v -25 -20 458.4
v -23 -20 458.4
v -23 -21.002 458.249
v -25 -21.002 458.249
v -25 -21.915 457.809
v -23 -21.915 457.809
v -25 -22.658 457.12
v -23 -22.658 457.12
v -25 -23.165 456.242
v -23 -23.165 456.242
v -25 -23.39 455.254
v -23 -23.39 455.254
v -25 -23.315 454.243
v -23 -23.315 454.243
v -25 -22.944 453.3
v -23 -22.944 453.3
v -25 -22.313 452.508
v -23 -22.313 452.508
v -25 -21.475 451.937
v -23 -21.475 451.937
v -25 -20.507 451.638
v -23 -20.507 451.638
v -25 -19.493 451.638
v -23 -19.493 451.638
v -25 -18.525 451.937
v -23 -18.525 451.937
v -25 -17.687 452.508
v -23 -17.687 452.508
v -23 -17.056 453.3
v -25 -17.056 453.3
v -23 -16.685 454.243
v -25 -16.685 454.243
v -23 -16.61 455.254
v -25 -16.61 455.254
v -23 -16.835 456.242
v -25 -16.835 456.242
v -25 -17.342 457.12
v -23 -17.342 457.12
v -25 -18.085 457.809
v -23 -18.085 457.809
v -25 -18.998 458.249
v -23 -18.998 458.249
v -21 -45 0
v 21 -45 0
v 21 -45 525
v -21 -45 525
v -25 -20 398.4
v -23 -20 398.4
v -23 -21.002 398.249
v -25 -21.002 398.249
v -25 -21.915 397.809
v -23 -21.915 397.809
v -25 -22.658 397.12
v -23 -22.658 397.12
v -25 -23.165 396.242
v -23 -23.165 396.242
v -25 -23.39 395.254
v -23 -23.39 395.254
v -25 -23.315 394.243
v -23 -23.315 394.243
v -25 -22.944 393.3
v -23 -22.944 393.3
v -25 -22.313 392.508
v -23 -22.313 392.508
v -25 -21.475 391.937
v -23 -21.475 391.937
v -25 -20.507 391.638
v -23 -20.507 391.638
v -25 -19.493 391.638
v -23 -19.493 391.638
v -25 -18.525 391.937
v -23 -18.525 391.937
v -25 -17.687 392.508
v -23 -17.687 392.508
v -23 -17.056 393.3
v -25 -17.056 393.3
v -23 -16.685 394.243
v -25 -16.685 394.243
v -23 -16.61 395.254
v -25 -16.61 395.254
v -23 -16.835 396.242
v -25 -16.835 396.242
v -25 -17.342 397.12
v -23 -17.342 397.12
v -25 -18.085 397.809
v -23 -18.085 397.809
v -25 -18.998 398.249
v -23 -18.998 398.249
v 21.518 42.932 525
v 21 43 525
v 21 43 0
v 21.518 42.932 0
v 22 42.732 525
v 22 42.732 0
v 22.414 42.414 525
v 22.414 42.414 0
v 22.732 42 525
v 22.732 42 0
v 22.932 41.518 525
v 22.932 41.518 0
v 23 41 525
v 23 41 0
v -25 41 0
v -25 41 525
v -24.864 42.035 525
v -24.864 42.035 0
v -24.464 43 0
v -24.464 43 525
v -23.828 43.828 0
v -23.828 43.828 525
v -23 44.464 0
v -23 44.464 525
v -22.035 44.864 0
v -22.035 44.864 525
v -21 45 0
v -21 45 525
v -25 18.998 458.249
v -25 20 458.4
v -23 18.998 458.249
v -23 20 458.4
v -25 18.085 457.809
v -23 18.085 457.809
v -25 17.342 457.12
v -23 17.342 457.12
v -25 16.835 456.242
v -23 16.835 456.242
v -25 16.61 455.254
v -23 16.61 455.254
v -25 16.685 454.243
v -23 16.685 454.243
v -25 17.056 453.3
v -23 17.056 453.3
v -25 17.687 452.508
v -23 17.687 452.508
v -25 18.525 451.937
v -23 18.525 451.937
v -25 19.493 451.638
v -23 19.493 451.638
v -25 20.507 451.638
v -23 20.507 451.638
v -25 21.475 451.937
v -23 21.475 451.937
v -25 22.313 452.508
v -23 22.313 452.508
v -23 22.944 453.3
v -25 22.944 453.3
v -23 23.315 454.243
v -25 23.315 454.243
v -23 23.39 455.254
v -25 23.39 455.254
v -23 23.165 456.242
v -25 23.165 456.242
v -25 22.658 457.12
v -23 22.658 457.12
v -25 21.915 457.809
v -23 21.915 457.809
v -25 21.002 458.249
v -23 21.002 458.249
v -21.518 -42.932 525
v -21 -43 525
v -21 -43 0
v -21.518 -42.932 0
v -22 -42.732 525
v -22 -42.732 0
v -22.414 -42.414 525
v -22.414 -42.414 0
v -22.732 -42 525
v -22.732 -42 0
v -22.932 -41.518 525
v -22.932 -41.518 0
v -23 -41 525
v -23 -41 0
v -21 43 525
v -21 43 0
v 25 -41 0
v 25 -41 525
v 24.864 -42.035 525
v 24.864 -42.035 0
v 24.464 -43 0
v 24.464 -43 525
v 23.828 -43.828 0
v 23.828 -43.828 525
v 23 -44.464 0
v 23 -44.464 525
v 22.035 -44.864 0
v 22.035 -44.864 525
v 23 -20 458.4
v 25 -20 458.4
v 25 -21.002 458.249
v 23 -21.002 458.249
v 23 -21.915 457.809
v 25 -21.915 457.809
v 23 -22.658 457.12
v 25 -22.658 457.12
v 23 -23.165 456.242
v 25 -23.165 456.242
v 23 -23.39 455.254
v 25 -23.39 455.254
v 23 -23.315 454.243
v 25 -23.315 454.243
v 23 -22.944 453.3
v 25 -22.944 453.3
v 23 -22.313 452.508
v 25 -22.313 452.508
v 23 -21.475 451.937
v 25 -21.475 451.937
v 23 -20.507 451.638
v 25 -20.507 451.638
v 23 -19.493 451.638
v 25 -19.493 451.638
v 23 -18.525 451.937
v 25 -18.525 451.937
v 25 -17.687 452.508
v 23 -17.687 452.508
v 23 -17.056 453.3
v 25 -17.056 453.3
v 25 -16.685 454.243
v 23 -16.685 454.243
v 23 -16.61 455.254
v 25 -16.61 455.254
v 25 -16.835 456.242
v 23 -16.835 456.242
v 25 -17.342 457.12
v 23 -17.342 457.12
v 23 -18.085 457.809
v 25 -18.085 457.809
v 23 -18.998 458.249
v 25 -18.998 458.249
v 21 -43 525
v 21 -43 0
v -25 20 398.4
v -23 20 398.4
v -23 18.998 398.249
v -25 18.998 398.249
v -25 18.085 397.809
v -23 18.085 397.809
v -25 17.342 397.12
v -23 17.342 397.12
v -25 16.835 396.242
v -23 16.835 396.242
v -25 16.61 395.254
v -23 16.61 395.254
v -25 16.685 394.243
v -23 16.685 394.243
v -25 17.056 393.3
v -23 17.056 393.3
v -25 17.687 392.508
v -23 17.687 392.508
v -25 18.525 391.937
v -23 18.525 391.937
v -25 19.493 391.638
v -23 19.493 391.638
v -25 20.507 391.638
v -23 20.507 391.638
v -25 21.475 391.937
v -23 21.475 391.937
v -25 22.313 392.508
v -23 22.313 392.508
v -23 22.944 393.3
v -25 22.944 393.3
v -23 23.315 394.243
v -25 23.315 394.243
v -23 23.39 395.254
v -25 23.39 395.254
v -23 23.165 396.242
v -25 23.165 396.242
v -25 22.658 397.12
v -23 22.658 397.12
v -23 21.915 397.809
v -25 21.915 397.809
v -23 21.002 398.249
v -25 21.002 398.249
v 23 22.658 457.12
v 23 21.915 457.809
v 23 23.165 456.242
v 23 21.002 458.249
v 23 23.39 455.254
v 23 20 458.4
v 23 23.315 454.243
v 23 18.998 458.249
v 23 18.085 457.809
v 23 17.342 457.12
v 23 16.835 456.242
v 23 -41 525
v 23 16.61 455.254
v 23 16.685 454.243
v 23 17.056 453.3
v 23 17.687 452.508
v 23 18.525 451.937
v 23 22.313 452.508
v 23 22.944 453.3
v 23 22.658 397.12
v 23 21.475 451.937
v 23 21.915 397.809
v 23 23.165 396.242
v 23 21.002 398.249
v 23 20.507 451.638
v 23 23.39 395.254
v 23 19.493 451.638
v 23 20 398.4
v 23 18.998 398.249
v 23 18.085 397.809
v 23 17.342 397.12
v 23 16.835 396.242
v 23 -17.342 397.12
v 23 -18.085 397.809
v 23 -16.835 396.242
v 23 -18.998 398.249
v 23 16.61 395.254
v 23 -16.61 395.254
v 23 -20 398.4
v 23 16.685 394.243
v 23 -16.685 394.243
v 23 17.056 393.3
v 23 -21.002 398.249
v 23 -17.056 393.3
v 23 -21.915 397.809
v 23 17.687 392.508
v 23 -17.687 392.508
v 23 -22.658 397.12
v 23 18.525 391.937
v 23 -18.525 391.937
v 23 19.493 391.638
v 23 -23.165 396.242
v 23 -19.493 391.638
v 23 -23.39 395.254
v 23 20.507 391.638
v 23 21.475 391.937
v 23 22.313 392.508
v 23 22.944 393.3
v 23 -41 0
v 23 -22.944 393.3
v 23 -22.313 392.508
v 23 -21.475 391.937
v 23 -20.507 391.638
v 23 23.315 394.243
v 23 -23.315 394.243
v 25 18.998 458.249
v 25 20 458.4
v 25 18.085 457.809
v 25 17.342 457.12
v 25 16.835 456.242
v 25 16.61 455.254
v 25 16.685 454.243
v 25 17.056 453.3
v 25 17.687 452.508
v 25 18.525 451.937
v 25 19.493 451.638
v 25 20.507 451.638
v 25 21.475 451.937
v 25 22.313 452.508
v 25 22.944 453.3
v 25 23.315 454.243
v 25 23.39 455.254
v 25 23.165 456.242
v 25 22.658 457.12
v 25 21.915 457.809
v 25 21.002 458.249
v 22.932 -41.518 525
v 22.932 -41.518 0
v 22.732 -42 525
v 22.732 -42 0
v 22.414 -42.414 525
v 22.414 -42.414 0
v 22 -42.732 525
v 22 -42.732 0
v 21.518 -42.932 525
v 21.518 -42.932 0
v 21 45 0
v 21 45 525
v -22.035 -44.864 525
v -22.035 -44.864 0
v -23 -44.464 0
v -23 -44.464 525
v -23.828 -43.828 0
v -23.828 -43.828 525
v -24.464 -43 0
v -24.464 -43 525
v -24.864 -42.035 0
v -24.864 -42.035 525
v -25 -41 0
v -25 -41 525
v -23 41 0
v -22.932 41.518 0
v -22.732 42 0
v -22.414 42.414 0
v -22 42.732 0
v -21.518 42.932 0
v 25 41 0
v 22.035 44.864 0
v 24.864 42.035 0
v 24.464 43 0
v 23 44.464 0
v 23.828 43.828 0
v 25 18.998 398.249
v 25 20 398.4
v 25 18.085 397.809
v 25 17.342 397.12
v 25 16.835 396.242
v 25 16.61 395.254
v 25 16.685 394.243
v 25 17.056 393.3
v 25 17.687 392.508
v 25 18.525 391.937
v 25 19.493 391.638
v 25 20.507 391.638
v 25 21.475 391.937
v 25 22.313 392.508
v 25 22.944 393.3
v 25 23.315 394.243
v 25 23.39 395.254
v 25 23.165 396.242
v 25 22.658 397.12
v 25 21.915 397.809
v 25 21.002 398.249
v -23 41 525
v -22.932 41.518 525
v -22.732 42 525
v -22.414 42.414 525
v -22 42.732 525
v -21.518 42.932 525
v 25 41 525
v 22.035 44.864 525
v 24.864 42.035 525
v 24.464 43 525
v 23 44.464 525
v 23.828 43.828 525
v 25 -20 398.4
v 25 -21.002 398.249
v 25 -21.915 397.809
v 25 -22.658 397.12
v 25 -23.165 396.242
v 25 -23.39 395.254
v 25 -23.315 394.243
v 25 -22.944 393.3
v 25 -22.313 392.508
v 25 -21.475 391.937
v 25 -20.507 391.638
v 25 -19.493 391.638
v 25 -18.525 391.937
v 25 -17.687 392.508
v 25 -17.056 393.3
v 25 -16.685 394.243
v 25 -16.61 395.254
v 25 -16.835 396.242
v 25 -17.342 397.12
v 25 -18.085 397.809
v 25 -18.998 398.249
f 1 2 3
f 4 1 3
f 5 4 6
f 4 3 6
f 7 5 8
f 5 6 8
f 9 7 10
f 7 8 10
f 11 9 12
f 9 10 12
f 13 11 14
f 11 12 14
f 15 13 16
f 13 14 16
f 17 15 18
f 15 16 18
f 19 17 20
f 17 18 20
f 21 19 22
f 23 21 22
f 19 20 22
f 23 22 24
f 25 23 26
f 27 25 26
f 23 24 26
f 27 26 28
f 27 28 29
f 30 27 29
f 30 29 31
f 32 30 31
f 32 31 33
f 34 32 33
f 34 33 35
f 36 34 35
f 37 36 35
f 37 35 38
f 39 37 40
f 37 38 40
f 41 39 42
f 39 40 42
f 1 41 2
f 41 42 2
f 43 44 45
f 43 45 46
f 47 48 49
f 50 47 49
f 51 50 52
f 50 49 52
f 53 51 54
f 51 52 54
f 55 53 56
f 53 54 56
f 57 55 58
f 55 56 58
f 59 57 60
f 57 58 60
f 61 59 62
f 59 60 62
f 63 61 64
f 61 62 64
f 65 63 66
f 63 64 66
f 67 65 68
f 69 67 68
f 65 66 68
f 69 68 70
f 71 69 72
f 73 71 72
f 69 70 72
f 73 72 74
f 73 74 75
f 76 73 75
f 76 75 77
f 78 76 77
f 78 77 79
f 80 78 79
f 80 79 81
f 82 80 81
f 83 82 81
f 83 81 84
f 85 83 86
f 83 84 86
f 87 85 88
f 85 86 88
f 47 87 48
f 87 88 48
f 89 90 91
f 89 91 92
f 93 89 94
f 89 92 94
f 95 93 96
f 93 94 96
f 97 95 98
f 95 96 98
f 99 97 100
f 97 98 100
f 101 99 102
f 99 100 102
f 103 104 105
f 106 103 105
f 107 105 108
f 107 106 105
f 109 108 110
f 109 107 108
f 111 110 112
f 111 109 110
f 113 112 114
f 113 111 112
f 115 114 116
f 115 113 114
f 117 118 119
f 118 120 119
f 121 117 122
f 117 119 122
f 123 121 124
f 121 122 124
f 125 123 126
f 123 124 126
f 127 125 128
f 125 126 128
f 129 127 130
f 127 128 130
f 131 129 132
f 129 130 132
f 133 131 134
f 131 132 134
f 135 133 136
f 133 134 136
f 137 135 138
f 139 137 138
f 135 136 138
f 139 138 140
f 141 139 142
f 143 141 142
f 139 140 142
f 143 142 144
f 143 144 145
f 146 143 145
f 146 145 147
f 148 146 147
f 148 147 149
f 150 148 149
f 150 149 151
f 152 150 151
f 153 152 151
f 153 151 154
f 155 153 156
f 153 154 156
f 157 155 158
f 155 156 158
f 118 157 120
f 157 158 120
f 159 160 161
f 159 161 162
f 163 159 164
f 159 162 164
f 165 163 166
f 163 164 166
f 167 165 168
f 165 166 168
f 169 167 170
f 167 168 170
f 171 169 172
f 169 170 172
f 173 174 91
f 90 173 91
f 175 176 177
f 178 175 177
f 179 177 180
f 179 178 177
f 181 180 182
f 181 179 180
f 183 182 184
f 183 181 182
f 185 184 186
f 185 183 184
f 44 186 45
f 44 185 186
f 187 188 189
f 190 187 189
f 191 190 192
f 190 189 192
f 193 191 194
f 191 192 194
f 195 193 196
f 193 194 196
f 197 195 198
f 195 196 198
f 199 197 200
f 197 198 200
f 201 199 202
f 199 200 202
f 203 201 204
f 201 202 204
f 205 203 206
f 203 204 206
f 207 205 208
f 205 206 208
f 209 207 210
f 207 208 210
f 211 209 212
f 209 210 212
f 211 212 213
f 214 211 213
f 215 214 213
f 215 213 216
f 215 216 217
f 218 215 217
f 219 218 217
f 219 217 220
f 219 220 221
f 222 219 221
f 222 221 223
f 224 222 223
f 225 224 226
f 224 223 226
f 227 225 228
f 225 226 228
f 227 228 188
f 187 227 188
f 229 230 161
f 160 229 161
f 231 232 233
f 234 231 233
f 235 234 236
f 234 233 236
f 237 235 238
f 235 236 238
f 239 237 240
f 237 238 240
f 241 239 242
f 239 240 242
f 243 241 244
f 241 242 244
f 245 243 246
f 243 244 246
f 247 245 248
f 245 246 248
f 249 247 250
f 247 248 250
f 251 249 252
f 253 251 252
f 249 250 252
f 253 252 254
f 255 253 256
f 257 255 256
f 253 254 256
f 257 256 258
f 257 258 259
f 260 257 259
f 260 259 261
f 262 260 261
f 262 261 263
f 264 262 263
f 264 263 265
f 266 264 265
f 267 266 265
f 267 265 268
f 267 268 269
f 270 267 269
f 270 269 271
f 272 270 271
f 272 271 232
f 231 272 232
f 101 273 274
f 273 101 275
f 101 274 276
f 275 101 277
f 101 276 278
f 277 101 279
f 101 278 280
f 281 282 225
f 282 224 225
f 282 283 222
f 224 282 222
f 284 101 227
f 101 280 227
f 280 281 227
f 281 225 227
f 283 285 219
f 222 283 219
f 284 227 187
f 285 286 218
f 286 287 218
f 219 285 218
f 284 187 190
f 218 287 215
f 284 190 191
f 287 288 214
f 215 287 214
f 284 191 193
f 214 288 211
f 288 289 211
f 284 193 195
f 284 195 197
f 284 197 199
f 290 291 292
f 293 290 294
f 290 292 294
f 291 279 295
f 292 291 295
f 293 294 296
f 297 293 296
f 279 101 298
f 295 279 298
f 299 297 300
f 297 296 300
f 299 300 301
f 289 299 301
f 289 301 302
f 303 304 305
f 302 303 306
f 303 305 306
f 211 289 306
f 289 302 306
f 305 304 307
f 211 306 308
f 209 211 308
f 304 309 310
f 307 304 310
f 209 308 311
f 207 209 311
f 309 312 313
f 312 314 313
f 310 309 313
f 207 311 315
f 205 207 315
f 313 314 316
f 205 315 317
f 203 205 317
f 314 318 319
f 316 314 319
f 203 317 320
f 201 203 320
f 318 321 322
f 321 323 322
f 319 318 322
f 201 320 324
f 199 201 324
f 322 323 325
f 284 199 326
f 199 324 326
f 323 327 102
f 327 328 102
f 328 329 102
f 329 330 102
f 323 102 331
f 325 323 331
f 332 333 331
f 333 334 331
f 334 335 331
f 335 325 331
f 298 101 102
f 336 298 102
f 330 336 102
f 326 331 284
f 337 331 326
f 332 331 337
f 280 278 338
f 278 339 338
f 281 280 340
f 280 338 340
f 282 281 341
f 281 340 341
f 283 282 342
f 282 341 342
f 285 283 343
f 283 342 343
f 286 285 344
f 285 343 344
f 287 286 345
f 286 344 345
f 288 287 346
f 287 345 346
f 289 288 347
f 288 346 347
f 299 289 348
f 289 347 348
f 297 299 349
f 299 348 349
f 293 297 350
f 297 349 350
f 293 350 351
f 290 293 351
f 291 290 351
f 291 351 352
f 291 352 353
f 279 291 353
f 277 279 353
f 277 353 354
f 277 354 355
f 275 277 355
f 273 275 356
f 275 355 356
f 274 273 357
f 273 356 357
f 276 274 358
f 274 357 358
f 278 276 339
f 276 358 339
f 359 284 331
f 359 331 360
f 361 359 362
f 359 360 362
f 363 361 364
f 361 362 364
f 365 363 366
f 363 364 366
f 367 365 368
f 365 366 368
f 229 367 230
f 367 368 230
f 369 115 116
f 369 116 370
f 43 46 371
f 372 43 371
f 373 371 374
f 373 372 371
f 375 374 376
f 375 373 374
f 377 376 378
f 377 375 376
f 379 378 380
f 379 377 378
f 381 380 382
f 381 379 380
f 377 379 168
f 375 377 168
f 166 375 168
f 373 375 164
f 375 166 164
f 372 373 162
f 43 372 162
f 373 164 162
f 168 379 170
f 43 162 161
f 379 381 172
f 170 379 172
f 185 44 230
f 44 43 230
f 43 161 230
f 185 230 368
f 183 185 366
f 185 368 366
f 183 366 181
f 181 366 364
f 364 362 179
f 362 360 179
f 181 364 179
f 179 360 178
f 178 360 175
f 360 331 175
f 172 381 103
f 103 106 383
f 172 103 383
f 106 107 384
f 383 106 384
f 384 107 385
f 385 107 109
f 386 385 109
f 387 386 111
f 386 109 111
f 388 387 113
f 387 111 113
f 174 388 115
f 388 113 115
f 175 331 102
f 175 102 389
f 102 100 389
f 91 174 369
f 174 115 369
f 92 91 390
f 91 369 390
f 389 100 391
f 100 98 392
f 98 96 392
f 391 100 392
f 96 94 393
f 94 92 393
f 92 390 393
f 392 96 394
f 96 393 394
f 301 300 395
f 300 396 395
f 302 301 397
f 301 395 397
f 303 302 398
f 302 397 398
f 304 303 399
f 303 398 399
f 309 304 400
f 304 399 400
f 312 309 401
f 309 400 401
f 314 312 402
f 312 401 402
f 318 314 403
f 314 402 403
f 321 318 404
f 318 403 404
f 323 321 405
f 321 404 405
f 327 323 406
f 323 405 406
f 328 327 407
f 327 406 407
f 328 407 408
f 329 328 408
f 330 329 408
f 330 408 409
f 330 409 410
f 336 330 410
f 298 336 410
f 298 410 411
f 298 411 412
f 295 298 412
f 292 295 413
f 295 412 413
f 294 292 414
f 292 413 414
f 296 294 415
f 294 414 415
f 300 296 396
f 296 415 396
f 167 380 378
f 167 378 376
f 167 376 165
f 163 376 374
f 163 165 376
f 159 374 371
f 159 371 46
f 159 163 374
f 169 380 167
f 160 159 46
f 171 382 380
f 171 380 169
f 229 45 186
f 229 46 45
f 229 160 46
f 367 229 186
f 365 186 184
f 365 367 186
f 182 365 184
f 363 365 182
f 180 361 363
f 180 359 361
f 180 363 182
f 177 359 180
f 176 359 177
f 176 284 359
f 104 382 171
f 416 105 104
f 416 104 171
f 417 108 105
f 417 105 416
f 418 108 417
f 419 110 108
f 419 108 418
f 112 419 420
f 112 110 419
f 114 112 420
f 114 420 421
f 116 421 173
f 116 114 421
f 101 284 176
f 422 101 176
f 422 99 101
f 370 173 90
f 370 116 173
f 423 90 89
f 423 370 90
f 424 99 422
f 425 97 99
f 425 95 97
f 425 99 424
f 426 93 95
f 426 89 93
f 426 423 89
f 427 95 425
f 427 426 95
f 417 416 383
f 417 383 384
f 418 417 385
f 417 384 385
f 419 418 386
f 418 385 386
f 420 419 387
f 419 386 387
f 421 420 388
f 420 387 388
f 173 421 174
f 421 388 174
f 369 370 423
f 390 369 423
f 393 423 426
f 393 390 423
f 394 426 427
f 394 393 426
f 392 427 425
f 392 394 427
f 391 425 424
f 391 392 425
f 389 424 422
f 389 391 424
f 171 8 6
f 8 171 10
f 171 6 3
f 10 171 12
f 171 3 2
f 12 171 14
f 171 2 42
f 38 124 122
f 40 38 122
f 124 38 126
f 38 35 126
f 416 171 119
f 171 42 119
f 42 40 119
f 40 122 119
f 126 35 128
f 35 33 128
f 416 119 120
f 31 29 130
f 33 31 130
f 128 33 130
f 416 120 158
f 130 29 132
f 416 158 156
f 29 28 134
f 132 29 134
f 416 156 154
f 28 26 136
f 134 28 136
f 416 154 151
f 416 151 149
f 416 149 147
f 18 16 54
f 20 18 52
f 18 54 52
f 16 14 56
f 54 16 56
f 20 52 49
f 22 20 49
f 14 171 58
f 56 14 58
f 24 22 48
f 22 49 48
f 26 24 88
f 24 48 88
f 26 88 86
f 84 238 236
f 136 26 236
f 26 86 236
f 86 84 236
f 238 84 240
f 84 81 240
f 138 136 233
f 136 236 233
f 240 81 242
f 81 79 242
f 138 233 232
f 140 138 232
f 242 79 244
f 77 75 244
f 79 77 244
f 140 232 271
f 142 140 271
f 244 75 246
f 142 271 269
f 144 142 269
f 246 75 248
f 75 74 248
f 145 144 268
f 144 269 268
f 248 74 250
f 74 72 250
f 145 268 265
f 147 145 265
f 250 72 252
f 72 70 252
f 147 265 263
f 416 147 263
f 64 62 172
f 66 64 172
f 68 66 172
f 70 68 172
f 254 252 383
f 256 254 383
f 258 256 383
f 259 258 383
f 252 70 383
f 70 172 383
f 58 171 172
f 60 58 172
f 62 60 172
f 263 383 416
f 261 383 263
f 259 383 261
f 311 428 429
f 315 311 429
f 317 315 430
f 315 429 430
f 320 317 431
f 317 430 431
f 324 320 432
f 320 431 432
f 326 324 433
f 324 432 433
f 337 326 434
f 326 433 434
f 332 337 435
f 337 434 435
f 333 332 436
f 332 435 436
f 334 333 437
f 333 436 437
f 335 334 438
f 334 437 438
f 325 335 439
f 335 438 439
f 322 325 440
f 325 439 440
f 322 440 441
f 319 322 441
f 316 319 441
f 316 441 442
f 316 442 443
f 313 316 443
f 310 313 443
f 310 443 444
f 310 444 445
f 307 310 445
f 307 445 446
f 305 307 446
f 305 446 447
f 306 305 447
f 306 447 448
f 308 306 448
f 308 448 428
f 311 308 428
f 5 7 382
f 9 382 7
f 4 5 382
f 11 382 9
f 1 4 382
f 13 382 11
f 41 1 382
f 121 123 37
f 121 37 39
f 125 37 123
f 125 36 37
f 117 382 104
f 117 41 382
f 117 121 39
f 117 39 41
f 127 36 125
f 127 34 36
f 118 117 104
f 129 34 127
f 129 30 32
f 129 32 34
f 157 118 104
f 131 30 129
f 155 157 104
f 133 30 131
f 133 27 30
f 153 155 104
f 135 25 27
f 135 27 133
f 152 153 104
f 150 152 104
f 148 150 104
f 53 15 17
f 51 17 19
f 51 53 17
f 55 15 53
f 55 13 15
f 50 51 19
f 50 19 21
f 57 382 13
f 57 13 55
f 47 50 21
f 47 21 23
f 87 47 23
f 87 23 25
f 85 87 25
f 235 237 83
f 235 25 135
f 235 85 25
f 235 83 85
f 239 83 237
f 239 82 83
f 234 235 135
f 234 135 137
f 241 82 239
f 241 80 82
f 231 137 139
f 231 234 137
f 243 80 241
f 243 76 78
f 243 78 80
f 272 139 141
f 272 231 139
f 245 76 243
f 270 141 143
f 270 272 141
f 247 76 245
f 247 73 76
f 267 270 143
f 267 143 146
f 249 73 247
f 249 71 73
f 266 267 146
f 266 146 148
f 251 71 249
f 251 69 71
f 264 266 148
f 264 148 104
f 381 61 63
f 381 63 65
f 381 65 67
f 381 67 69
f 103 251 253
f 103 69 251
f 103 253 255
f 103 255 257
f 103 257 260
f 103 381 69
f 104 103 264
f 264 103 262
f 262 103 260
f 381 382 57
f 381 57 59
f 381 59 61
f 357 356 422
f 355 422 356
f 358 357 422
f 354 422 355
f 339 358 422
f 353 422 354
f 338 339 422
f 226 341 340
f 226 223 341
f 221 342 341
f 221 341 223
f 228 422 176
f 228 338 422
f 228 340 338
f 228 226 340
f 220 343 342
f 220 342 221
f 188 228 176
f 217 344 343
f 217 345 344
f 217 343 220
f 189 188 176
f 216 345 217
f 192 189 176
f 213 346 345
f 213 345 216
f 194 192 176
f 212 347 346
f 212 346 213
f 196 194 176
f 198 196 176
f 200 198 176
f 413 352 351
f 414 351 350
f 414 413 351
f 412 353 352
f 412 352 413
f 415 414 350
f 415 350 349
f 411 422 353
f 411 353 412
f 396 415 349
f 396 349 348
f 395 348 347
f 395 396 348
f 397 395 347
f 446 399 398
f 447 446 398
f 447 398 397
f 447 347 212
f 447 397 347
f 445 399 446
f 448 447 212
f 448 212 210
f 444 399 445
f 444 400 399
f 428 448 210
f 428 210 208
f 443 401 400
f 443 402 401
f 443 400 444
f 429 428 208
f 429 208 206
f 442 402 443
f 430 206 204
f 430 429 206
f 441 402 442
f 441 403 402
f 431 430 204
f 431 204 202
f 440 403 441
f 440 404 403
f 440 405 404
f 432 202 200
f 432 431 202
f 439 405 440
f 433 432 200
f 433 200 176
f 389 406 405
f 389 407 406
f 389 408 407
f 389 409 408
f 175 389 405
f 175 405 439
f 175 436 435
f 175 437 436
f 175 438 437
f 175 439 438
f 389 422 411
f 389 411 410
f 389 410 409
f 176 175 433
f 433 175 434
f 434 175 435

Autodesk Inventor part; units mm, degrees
ref_plane "Start Plane" through (0, 0, 0) normal (0, 0, 1) x (1, 0, 0)
ref_plane "End Plane" through (0, 0, 525) normal (0, 0, 1) x (1, 0, 0)
sketch "Sketch" plane through (0, 0, 0) normal (0, 0, 1) x (1, 0, 0)
  line L0 (-25, -41) -> (-25, 41)
  line L1 (-21, 45) -> (21, 45)
  line L2 (25, 41) -> (25, -41)
  line L3 (21, -45) -> (-21, -45)
  arc A0 (-25, -41) -> (-21, -45) centre (-21, -41) ccw
  arc A1 (25, 41) -> (21, 45) centre (21, 41) ccw
  arc A2 (-21, 45) -> (-25, 41) centre (-21, 41) ccw
  arc A3 (21, -45) -> (25, -41) centre (21, -41) ccw
  arc A4 (-21, 43) -> (-23, 41) centre (-21, 41) ccw
  line L4 (-21, 43) -> (21, 43)
  arc A5 (23, 41) -> (21, 43) centre (21, 41) ccw
  line L5 (23, 41) -> (23, -41)
  arc A6 (21, -43) -> (23, -41) centre (21, -41) ccw
  line L6 (21, -43) -> (-21, -43)
  arc A7 (-23, -41) -> (-21, -43) centre (-21, -41) ccw
  line L7 (-23, -41) -> (-23, 41)
  line L8 (0, 64.1598) -> (0, -64.1598) construction
  line L9 (-36.1598, 0) -> (36.1598, 0) construction
  dimension "d7" = 4
  dimension "d9" = 50
  dimension "d11" = 90
  dimension "d12" = 2
  dimension "d15" = 25
  dimension "d16" = 45
extrude "Body" add sketch "Sketch" along normal up to surface (525 mm away) from surface at 0
sketch "Sketch3" plane through (0, 0, 0) normal (0, 0, 1) x (1, 0, 0)
  line L0 (0, 0) -> (10, 0)
ref_plane "Work Plane3" through (0, 0, 0) normal (0, -1, 0) x (1, 0, 0)
sketch "Sketch4" plane through (0, 0, 0) normal (0, -1, 0) x (1, 0, 0)
  line L0 (-2, 0) -> (12, 0)
  line L1 (-2, 525) -> (12, 525)
  dimension "d18" = 525
ref_plane "Work Plane4" through (21, 2290, 525) normal (0, 0, 1) x (1, 0, 0)
split "Split1" plane through (21, 2290, 525) removes the side toward (0, 0, 1)
sketch "Sketch5" plane through (-25, 41, 0) normal (-1, 0, 0) x (0, 0, 1)
  line L0 (395, -21) -> (455, -21)
  line L1 (455, -21) -> (455, -61)
  line L2 (455, -61) -> (395, -61)
  line L3 (395, -61) -> (395, -21)
  line L4 (525, -82) -> (525, 0) projected
  line L5 (525, -41) -> (516.5048, -41)
  point P0 (0, -41)
  dimension "d19" = 60
  dimension "d20" = 40
  dimension "d21" = 70
hole "Hole1" at (-25, 20, 395) at (-25, -20, 395) at (-25, 20, 455) at (-25, -20, 455) direction (1, 0, 0) diameter 6.8 end through all
equation "\"d7\" = G_IR"
equation "\"d9\" = G_W"
equation "\"d11\" = G_H"
equation "\"d12\" = G_T"
equation "\"d15\" = 0.5 * d9"
equation "\"d16\" = 0.5 * d11"
equation "\"d3\" = G_L"
equation "\"G_W\" = 50"
equation "\"G_H\" = 90"
equation "\"G_T\" = 2"
equation "\"G_IR\" = 4"
equation "\"G_L\" = d18"
equation "\"G_OFFSET_START\" = 0"
equation "\"G_OFFSET_END\" = -25"
equation "\"d14\" = G_OFFSET_END + B_L"
equation "\"B_L\" = 550"
properties part number "ISO 10799-2 - 90x50x2 - 525" material "Steel, Mild"
